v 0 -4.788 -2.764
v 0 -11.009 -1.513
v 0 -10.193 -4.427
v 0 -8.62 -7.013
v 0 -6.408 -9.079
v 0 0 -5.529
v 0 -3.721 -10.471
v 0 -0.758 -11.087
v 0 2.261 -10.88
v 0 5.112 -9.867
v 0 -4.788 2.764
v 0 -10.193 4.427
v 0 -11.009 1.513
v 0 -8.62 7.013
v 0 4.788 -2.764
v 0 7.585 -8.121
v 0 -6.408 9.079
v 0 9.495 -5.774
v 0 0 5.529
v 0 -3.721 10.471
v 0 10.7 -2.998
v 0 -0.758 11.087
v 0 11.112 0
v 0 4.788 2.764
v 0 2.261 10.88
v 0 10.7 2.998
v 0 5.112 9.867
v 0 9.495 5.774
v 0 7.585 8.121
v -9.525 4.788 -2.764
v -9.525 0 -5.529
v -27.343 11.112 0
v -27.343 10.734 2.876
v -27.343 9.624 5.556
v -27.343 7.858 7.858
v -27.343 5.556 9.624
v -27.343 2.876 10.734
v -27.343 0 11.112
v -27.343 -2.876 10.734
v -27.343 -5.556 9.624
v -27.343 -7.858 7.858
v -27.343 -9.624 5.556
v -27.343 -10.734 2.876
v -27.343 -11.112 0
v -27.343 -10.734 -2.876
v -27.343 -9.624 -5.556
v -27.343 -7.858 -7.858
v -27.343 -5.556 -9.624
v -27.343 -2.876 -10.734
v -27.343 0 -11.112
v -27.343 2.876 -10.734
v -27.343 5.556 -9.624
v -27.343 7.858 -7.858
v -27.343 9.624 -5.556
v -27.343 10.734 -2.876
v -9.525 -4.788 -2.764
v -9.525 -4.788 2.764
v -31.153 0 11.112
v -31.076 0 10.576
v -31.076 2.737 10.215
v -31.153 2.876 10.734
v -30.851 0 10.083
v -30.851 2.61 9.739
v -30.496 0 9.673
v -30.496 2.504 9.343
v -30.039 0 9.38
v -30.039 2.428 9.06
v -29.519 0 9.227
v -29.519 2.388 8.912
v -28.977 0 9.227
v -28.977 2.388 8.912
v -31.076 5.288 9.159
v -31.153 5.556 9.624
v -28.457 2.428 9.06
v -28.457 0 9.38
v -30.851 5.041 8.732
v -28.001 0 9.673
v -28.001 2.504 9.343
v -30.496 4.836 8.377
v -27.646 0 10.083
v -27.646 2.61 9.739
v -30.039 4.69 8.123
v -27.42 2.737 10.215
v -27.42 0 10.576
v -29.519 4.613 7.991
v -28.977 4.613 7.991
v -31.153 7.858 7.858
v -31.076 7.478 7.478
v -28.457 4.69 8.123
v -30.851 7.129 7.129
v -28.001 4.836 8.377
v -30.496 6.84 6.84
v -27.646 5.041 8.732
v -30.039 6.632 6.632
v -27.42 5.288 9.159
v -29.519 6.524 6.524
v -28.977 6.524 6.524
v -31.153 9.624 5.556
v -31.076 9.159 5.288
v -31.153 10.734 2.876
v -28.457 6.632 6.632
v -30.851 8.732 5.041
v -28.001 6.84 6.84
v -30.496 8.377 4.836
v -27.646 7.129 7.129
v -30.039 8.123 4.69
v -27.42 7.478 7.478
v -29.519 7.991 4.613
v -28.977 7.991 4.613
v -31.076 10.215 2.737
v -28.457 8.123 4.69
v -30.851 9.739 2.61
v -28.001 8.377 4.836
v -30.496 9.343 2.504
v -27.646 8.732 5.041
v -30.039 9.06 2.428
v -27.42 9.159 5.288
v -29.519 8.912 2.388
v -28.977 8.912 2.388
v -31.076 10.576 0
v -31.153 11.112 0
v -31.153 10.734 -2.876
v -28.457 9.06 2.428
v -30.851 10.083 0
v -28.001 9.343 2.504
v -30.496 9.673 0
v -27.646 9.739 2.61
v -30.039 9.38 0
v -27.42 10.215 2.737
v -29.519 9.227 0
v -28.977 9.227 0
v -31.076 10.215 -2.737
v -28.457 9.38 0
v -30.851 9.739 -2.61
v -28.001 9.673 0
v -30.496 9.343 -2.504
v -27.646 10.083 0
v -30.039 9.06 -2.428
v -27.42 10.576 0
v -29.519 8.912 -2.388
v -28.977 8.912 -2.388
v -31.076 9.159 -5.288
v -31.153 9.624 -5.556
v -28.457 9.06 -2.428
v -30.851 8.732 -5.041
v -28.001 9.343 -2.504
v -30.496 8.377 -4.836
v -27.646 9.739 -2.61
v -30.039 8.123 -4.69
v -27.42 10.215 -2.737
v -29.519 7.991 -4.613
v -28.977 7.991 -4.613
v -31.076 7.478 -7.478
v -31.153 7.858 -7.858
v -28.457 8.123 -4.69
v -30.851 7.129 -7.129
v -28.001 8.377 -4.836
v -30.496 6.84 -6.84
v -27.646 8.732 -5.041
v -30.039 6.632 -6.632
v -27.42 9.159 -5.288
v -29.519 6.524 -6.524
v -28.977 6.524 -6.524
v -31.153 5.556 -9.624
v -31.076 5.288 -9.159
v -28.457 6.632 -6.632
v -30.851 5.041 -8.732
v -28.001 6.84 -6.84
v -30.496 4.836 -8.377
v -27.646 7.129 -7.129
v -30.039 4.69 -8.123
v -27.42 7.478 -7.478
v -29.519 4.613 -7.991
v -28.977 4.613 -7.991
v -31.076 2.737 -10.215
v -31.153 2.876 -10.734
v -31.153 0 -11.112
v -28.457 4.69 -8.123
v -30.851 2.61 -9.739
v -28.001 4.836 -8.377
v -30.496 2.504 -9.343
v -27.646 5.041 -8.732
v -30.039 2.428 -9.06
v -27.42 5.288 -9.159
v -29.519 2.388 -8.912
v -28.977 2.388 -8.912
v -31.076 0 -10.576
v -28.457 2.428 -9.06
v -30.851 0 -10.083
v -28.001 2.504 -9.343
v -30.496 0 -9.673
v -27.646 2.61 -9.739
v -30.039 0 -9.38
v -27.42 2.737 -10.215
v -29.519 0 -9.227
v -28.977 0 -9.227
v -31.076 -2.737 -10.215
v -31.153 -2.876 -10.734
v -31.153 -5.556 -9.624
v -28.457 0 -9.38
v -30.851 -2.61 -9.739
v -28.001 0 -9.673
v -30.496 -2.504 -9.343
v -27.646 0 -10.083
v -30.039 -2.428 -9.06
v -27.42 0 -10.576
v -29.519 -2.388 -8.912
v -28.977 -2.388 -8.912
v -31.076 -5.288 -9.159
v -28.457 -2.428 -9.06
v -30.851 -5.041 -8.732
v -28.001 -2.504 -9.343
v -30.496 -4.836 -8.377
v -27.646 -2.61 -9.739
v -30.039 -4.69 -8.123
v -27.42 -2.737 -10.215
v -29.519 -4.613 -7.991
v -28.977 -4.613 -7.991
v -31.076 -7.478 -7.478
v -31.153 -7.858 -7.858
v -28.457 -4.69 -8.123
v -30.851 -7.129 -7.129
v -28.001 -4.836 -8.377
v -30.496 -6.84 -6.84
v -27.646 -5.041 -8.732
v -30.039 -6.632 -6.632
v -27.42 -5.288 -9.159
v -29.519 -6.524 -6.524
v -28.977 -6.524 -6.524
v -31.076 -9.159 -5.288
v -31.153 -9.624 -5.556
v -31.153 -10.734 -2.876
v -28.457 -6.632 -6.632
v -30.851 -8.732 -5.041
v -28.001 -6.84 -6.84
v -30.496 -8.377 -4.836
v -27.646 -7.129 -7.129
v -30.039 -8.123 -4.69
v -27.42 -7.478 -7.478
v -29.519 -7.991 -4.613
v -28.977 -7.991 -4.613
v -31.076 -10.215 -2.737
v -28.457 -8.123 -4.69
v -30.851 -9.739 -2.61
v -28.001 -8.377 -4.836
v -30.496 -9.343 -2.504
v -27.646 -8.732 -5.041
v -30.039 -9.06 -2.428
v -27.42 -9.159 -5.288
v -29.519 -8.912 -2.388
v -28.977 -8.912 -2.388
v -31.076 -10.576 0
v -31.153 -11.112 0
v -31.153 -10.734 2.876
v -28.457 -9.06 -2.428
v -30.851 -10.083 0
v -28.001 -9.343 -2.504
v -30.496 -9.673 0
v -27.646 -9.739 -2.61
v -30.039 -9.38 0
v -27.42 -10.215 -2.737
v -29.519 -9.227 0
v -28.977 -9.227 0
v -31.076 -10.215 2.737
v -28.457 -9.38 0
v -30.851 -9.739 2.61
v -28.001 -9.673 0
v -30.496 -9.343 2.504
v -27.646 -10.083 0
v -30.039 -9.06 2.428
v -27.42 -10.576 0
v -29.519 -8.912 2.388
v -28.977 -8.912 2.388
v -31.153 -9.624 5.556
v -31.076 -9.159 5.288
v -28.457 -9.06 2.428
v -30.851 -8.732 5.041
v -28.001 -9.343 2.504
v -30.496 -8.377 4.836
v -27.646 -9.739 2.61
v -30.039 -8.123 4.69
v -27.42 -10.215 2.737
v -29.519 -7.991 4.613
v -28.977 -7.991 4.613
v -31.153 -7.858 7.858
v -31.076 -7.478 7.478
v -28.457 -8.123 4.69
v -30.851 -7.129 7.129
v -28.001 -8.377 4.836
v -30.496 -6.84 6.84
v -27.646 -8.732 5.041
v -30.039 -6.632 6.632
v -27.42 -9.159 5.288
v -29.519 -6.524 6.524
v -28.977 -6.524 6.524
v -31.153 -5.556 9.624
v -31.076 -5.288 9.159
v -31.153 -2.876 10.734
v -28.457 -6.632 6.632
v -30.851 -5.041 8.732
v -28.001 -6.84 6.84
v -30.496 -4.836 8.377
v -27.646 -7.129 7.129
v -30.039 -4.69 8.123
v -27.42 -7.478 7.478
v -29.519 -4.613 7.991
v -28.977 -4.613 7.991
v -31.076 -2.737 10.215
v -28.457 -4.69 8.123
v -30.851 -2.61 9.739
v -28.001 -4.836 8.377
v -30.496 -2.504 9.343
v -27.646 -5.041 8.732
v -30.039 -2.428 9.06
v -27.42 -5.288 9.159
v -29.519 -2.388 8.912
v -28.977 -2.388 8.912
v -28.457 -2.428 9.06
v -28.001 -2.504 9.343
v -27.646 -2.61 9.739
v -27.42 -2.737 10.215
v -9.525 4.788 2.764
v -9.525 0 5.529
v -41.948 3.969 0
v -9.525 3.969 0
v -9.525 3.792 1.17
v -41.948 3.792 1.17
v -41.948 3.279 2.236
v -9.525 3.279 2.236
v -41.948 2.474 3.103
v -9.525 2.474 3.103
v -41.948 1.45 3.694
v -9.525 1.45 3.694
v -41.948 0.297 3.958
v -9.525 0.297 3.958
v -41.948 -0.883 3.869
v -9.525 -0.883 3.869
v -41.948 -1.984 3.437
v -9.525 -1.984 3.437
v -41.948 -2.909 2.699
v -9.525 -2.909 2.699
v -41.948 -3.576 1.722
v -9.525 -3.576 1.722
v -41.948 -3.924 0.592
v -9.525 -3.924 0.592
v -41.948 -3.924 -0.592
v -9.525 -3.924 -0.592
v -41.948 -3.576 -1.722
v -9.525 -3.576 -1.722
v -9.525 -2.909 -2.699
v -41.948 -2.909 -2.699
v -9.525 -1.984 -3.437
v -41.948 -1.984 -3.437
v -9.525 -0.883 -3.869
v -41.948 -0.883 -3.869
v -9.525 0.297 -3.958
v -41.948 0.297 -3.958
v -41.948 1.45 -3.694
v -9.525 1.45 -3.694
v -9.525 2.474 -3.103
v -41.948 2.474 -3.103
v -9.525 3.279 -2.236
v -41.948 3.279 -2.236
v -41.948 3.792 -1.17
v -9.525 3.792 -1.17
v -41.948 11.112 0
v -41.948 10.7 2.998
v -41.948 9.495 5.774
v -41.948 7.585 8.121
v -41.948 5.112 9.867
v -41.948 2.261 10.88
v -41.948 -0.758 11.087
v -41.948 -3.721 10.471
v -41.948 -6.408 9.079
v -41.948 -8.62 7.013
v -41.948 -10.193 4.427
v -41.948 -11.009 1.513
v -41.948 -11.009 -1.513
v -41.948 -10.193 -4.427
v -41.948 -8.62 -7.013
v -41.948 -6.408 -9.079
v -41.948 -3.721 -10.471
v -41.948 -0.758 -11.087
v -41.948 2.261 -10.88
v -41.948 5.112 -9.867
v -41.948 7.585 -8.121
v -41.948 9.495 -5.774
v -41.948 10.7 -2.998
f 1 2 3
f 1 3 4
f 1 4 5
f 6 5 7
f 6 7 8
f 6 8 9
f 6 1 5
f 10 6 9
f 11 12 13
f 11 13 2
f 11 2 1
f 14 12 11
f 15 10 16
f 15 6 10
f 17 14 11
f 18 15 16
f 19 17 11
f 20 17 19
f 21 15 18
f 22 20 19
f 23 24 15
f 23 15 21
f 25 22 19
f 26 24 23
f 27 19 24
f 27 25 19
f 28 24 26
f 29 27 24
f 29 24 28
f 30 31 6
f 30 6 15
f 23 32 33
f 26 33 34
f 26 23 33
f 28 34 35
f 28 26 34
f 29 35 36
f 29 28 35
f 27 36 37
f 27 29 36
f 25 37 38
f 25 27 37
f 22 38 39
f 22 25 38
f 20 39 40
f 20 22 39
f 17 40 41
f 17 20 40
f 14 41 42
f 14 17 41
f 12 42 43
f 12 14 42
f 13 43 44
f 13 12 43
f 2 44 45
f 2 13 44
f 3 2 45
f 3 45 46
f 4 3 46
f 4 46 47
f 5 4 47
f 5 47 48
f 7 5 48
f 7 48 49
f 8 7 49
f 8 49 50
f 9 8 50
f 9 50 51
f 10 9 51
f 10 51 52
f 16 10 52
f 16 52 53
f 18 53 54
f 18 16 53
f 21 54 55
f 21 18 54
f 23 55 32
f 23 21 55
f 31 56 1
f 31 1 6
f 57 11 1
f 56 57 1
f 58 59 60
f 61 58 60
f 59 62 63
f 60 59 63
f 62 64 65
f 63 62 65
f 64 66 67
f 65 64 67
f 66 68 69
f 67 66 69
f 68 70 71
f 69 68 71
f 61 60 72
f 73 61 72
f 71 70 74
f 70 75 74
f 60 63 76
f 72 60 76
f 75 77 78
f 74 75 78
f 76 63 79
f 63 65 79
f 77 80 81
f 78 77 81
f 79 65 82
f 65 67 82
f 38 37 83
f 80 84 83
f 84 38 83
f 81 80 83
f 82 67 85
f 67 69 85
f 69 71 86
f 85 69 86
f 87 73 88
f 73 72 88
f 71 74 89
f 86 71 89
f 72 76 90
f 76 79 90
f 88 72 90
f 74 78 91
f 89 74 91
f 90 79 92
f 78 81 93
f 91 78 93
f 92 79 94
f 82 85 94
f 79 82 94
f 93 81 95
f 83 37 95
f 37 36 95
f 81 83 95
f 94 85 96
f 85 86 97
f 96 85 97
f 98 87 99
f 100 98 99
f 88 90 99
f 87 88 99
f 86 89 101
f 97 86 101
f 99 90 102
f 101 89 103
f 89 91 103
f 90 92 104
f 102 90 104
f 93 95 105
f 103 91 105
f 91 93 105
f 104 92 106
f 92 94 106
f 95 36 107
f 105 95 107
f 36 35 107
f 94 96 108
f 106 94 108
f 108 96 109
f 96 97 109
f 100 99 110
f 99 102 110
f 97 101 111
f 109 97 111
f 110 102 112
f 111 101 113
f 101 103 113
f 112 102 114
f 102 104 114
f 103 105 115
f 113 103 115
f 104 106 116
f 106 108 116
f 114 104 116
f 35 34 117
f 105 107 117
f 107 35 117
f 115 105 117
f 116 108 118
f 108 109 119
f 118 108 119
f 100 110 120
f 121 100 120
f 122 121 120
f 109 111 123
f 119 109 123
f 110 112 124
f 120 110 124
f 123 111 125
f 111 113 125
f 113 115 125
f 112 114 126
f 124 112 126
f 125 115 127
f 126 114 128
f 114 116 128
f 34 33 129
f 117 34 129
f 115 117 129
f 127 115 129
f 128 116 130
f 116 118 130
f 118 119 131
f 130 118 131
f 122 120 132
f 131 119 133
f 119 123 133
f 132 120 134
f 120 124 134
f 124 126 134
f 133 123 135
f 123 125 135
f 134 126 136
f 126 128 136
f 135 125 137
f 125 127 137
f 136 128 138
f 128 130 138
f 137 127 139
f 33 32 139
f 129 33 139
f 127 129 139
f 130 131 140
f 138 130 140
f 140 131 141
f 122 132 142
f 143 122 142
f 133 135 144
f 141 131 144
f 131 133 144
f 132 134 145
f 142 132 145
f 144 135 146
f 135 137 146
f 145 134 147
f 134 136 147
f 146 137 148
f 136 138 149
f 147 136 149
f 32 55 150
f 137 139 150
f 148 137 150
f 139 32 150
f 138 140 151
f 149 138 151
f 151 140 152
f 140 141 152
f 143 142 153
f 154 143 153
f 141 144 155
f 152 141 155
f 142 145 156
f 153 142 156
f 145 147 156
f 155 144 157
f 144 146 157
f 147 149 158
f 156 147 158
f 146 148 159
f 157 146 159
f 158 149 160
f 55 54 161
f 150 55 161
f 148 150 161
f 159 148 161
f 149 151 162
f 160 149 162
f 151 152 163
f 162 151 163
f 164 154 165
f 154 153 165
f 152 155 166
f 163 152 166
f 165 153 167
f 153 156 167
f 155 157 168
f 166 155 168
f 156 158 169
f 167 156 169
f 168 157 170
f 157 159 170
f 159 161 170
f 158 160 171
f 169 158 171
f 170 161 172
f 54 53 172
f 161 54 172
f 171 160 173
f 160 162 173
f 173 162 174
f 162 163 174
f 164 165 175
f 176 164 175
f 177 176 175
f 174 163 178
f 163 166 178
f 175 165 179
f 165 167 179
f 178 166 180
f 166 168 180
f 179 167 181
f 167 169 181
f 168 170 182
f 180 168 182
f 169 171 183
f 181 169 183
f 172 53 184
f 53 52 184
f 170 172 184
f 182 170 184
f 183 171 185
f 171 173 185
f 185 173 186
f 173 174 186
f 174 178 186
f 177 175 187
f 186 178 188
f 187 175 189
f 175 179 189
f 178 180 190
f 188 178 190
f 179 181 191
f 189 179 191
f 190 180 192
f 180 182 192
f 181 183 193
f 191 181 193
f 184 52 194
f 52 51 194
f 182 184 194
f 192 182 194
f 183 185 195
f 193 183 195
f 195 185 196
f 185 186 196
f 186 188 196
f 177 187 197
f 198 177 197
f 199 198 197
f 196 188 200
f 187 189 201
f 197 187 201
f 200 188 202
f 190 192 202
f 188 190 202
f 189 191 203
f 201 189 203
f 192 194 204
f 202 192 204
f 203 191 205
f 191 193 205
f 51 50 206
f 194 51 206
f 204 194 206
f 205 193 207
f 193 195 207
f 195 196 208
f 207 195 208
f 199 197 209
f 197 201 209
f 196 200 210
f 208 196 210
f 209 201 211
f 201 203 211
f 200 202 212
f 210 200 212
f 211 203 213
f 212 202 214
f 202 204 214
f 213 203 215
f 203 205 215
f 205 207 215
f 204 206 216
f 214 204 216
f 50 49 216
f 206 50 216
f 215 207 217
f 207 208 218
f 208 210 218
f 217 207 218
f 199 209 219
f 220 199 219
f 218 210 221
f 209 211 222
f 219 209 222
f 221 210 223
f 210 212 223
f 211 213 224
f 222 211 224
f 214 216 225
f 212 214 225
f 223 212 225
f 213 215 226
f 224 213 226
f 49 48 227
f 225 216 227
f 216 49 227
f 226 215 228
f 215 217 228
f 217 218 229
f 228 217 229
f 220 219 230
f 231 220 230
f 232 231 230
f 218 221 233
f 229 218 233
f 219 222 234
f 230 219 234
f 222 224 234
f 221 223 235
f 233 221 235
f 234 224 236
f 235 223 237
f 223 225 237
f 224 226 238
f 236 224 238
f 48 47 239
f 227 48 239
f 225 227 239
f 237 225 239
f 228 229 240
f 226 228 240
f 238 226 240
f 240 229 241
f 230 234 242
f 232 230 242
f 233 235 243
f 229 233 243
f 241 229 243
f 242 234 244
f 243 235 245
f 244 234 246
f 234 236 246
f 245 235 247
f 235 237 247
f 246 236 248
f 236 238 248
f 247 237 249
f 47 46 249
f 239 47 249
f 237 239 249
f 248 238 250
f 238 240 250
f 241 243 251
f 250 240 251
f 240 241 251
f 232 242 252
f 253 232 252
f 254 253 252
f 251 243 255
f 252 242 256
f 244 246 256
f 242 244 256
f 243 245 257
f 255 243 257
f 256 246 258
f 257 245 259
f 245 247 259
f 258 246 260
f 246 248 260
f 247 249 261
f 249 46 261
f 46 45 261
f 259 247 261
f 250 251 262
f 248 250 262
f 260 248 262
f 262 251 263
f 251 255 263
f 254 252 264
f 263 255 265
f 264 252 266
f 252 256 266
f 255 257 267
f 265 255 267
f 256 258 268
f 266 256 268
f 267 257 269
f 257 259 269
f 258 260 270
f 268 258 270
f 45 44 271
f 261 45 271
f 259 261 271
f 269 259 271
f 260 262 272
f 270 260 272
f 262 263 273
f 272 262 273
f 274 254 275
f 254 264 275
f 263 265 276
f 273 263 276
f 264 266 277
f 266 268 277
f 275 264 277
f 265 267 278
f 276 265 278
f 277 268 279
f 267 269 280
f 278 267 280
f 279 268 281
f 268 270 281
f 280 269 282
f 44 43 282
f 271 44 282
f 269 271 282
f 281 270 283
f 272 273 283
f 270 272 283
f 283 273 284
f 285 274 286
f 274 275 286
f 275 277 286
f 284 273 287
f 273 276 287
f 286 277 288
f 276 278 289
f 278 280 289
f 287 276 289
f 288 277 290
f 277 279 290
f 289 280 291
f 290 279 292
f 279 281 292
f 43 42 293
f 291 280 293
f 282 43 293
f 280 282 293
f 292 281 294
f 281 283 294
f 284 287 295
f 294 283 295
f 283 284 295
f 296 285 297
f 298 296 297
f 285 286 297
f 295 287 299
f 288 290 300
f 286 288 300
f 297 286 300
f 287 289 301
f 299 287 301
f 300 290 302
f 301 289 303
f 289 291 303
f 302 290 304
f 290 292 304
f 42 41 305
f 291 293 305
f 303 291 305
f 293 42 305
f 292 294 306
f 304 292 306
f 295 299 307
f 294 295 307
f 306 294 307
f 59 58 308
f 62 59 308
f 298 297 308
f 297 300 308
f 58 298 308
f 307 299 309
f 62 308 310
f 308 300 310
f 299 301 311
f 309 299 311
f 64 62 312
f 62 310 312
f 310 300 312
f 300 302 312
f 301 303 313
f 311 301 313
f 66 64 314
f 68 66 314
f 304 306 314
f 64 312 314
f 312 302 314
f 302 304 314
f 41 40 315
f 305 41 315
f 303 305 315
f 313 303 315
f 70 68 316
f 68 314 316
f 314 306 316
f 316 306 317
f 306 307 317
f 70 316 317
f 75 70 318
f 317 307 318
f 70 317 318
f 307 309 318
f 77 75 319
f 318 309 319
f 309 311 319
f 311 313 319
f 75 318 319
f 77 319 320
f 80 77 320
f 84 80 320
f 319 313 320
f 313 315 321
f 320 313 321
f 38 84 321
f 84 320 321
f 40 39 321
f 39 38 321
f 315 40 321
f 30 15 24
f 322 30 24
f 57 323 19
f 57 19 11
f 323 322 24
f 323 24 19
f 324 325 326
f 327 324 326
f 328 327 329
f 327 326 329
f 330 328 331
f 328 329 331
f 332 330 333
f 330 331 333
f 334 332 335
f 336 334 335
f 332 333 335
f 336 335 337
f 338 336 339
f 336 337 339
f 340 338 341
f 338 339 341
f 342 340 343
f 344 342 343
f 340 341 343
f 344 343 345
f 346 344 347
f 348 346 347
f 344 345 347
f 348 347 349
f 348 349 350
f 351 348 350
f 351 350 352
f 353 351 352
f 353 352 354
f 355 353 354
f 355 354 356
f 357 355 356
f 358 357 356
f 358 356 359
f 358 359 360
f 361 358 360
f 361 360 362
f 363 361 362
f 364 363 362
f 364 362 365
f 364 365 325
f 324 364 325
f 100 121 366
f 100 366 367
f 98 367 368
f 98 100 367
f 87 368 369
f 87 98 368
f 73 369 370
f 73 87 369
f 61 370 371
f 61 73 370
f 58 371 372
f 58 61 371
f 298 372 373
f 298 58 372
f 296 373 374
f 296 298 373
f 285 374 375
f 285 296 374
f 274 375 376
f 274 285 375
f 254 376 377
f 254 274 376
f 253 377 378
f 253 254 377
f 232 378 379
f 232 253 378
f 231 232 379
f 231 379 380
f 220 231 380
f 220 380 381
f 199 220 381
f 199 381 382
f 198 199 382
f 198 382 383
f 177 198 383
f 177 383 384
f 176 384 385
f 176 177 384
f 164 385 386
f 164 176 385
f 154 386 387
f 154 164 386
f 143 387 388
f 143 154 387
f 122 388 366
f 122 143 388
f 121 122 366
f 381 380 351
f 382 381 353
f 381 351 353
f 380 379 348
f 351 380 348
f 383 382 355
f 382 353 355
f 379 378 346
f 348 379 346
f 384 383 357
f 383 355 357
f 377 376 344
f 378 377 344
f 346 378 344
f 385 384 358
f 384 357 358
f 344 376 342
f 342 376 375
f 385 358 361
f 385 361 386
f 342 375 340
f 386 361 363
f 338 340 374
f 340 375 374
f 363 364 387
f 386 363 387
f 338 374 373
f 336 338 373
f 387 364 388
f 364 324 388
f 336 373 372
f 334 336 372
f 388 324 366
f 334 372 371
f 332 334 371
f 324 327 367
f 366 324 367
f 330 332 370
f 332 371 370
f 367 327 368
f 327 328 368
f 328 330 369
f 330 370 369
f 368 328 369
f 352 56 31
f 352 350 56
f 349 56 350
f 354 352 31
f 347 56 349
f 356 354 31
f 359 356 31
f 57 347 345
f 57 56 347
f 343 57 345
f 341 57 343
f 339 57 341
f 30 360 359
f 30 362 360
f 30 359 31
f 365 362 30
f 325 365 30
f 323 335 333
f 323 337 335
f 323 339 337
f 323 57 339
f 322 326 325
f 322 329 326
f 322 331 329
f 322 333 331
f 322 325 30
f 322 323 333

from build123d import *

# Parameters (mm, degrees)
F0_R     = 11.1125
F1_DEPTH = 41.9481
F3_DEPTH = 9.525
F5_D     = 7.9375
F5_DEPTH = 34.7472
F5_TIP   = 2.3846655818
F6_R     = 1.905


with BuildPart() as f1:
    # F0 (on Right) → F1 (new body)
    with BuildSketch(Plane.YZ):
        Circle(F0_R)
    extrude(amount=-F1_DEPTH)

    # F2 (on Right) → F3 (cut)
    with BuildSketch(Plane.YZ):
        Polygon((4.7879, -2.7642953539), (4.7879, 2.7642953539), (0, 5.5285907077), (-4.7879, 2.7642953539), (-4.7879, -2.7642953539), (0, -5.5285907077), align=None)
    extrude(amount=-F3_DEPTH, mode=Mode.SUBTRACT)

    # F5
    with Locations(Plane(origin=(-41.9481, 0, 0), x_dir=(0, -1, 0), z_dir=(-1, 0, 0))):
        with Locations((0, 0)):
            Hole(F5_D / 2, depth=F5_DEPTH)
            with Locations((0, 0, -(F5_DEPTH + F5_TIP / 2))):  # 118° drill point
                Cone(0, F5_D / 2, F5_TIP, mode=Mode.SUBTRACT)

    # F6 (on Front) → F7 (revolve, cut)
    with BuildSketch(Plane.XZ):
        with Locations((-29.2481, 11.1125)):
            Circle(F6_R)
    revolve(axis=Axis((-32.1425274014, 0, 0), (-1, 0, 0)), mode=Mode.SUBTRACT)


solid = f1.part
